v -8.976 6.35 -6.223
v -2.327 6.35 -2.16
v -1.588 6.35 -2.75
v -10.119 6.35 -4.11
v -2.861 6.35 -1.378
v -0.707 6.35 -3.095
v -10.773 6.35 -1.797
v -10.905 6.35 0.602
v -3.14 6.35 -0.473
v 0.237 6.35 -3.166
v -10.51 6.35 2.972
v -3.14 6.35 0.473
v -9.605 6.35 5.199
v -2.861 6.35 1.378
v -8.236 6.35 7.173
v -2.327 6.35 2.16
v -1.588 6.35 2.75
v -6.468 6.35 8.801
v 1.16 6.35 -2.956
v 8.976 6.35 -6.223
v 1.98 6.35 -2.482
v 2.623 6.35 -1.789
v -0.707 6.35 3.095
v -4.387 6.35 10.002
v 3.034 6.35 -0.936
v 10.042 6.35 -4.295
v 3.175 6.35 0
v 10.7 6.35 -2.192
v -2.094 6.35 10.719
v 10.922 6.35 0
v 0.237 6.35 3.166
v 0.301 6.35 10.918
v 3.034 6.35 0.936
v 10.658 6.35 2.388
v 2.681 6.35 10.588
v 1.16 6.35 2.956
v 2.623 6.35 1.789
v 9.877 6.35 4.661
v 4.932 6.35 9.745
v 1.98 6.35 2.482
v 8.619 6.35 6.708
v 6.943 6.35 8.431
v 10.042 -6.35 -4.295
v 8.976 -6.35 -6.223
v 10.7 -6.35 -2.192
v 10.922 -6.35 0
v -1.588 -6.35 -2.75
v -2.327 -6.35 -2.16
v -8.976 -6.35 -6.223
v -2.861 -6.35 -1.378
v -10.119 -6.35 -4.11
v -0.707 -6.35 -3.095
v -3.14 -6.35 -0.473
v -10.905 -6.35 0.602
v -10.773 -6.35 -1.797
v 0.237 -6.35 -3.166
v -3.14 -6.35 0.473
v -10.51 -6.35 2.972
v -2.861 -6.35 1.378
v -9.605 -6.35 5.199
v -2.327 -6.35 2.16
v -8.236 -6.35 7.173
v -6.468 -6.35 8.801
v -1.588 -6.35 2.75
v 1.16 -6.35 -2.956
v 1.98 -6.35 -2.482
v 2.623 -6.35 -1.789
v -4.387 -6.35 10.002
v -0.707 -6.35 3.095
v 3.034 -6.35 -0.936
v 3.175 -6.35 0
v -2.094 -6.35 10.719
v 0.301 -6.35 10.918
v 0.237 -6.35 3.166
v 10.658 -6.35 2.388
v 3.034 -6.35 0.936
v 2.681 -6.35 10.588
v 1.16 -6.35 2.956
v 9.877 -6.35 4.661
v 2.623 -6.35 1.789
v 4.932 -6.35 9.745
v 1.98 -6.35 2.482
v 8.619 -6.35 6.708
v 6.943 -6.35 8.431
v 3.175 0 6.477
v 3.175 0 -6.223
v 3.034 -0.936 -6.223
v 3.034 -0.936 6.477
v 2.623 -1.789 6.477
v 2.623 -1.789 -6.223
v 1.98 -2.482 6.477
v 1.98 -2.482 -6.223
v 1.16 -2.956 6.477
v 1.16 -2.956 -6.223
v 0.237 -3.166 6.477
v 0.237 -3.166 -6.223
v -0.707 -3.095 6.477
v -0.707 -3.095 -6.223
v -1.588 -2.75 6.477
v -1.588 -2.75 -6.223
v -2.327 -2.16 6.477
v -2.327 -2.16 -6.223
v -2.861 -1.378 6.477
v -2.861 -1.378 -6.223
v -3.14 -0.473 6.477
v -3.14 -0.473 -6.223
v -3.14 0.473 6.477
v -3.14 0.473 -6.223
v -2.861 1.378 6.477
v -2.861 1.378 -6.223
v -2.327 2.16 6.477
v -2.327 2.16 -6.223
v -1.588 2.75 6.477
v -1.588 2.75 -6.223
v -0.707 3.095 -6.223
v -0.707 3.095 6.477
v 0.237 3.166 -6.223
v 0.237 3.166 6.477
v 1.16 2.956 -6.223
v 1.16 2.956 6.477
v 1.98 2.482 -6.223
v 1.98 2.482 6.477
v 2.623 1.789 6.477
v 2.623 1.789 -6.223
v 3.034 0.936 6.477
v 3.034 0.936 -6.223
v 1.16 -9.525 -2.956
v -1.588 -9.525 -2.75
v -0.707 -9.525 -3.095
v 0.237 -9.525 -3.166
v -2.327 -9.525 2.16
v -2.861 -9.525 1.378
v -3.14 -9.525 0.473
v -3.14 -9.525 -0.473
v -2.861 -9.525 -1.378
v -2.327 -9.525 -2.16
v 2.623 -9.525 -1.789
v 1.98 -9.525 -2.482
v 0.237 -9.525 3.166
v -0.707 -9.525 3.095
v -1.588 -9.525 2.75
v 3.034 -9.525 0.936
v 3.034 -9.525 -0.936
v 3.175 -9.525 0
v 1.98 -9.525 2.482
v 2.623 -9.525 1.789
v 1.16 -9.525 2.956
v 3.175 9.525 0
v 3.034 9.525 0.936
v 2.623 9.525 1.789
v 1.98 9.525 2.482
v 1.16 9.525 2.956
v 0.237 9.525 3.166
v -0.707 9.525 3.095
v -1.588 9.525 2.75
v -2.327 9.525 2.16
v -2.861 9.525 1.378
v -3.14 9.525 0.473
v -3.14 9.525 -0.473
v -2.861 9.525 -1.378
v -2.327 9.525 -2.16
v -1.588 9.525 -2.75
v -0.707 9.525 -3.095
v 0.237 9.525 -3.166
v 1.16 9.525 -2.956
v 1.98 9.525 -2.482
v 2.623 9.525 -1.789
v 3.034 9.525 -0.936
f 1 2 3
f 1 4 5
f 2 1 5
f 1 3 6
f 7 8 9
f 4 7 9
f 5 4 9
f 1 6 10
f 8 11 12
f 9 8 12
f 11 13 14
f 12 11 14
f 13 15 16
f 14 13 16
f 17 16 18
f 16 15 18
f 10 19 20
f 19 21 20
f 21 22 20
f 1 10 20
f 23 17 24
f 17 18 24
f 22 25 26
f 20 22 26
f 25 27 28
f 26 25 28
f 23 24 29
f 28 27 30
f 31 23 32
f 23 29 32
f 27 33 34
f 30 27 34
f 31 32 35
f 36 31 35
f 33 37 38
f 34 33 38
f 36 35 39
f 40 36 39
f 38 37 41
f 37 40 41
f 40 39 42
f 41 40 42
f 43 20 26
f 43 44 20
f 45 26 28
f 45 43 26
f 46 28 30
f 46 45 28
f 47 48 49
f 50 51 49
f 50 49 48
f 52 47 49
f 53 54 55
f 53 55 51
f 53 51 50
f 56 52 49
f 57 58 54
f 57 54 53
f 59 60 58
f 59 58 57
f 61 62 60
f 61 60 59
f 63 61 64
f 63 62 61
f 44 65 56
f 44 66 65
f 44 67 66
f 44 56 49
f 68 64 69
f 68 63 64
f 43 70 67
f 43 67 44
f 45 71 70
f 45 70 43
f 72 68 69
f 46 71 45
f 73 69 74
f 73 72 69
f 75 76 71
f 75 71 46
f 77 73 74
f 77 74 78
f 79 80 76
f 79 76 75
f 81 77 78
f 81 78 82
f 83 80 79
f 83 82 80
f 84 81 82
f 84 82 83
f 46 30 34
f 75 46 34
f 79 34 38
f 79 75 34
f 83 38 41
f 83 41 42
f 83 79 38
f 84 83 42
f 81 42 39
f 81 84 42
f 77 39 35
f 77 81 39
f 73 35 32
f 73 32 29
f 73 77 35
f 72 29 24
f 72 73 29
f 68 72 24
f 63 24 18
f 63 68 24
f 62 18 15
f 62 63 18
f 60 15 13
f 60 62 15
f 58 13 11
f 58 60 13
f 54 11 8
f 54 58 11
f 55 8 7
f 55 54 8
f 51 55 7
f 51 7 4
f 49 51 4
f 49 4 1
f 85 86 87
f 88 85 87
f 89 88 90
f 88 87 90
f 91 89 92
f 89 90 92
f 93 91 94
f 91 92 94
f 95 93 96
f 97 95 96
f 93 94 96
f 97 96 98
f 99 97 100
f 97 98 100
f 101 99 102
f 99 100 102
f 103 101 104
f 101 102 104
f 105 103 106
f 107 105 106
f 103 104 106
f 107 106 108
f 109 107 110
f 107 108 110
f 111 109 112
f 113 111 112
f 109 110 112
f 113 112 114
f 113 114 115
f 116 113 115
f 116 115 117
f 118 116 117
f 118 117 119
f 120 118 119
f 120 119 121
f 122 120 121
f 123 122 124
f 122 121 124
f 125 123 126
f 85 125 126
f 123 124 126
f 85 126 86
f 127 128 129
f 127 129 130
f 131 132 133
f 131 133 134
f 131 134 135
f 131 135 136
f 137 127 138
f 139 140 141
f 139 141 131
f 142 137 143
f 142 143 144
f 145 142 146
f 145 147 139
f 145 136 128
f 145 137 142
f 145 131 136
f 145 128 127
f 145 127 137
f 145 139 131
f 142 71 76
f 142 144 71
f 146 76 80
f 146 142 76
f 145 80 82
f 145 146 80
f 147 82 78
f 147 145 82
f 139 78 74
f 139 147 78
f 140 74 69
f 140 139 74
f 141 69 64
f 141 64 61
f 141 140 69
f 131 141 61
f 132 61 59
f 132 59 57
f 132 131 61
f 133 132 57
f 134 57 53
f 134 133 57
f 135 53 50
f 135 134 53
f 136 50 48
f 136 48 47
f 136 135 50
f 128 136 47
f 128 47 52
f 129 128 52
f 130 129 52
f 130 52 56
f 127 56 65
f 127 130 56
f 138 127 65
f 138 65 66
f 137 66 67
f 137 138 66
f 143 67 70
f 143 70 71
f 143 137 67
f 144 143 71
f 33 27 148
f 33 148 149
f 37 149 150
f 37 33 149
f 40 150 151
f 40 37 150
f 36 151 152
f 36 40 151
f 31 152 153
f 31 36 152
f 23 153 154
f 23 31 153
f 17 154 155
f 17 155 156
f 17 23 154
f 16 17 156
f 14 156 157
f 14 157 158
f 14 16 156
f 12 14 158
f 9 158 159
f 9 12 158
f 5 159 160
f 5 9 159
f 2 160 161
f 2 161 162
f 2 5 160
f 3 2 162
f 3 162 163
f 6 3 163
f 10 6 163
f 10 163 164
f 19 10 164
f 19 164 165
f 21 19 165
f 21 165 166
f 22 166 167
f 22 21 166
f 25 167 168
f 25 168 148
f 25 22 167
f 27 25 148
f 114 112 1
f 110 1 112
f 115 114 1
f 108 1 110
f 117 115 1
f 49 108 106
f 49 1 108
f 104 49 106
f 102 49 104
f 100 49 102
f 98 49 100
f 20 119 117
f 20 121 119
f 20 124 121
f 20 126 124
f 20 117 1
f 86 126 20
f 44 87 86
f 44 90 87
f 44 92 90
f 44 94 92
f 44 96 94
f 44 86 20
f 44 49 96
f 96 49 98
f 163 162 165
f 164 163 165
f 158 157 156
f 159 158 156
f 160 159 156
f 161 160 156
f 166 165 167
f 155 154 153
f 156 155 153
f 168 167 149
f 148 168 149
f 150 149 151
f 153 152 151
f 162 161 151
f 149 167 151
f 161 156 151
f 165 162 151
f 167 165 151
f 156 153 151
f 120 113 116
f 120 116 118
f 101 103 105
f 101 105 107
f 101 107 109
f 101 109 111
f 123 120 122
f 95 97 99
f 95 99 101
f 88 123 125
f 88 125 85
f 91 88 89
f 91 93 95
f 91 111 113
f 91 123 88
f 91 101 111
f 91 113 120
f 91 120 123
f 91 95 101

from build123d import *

# Parameters (mm, degrees)
F0_R     = 3.175
F1_DEPTH = 6.35
F2_DEPTH = 9.525
F3_R     = 3.175
F4_DEPTH = 12.7


with BuildPart() as f1:
    # F0 (on Front) → F1 (new body, symmetric)
    with BuildSketch(Plane.XZ):
        with BuildLine():
            ThreePointArc((8.975765, -6.223), (10.424092, -3.260121), (10.922, 0))
            ThreePointArc((10.922, 0), (-3.260121, 10.424092), (-8.975765, -6.223))
            Line((-8.975765, -6.223), (8.975765, -6.223))
        make_face()
        Circle(F0_R, mode=Mode.SUBTRACT)
    extrude(amount=F1_DEPTH, both=True)

    # F0 (on Front) → F2 (join, symmetric)
    with BuildSketch(Plane.XZ):
        Circle(F0_R)
    extrude(amount=F2_DEPTH, both=True)

    # F3 (on face) → F4 (cut)
    with BuildSketch(Plane(origin=(0, 0, -6.223), x_dir=(1, 0, 0), z_dir=(0, 0, -1))):
        Circle(F3_R)
    extrude(amount=-F4_DEPTH, mode=Mode.SUBTRACT)


solid = f1.part
